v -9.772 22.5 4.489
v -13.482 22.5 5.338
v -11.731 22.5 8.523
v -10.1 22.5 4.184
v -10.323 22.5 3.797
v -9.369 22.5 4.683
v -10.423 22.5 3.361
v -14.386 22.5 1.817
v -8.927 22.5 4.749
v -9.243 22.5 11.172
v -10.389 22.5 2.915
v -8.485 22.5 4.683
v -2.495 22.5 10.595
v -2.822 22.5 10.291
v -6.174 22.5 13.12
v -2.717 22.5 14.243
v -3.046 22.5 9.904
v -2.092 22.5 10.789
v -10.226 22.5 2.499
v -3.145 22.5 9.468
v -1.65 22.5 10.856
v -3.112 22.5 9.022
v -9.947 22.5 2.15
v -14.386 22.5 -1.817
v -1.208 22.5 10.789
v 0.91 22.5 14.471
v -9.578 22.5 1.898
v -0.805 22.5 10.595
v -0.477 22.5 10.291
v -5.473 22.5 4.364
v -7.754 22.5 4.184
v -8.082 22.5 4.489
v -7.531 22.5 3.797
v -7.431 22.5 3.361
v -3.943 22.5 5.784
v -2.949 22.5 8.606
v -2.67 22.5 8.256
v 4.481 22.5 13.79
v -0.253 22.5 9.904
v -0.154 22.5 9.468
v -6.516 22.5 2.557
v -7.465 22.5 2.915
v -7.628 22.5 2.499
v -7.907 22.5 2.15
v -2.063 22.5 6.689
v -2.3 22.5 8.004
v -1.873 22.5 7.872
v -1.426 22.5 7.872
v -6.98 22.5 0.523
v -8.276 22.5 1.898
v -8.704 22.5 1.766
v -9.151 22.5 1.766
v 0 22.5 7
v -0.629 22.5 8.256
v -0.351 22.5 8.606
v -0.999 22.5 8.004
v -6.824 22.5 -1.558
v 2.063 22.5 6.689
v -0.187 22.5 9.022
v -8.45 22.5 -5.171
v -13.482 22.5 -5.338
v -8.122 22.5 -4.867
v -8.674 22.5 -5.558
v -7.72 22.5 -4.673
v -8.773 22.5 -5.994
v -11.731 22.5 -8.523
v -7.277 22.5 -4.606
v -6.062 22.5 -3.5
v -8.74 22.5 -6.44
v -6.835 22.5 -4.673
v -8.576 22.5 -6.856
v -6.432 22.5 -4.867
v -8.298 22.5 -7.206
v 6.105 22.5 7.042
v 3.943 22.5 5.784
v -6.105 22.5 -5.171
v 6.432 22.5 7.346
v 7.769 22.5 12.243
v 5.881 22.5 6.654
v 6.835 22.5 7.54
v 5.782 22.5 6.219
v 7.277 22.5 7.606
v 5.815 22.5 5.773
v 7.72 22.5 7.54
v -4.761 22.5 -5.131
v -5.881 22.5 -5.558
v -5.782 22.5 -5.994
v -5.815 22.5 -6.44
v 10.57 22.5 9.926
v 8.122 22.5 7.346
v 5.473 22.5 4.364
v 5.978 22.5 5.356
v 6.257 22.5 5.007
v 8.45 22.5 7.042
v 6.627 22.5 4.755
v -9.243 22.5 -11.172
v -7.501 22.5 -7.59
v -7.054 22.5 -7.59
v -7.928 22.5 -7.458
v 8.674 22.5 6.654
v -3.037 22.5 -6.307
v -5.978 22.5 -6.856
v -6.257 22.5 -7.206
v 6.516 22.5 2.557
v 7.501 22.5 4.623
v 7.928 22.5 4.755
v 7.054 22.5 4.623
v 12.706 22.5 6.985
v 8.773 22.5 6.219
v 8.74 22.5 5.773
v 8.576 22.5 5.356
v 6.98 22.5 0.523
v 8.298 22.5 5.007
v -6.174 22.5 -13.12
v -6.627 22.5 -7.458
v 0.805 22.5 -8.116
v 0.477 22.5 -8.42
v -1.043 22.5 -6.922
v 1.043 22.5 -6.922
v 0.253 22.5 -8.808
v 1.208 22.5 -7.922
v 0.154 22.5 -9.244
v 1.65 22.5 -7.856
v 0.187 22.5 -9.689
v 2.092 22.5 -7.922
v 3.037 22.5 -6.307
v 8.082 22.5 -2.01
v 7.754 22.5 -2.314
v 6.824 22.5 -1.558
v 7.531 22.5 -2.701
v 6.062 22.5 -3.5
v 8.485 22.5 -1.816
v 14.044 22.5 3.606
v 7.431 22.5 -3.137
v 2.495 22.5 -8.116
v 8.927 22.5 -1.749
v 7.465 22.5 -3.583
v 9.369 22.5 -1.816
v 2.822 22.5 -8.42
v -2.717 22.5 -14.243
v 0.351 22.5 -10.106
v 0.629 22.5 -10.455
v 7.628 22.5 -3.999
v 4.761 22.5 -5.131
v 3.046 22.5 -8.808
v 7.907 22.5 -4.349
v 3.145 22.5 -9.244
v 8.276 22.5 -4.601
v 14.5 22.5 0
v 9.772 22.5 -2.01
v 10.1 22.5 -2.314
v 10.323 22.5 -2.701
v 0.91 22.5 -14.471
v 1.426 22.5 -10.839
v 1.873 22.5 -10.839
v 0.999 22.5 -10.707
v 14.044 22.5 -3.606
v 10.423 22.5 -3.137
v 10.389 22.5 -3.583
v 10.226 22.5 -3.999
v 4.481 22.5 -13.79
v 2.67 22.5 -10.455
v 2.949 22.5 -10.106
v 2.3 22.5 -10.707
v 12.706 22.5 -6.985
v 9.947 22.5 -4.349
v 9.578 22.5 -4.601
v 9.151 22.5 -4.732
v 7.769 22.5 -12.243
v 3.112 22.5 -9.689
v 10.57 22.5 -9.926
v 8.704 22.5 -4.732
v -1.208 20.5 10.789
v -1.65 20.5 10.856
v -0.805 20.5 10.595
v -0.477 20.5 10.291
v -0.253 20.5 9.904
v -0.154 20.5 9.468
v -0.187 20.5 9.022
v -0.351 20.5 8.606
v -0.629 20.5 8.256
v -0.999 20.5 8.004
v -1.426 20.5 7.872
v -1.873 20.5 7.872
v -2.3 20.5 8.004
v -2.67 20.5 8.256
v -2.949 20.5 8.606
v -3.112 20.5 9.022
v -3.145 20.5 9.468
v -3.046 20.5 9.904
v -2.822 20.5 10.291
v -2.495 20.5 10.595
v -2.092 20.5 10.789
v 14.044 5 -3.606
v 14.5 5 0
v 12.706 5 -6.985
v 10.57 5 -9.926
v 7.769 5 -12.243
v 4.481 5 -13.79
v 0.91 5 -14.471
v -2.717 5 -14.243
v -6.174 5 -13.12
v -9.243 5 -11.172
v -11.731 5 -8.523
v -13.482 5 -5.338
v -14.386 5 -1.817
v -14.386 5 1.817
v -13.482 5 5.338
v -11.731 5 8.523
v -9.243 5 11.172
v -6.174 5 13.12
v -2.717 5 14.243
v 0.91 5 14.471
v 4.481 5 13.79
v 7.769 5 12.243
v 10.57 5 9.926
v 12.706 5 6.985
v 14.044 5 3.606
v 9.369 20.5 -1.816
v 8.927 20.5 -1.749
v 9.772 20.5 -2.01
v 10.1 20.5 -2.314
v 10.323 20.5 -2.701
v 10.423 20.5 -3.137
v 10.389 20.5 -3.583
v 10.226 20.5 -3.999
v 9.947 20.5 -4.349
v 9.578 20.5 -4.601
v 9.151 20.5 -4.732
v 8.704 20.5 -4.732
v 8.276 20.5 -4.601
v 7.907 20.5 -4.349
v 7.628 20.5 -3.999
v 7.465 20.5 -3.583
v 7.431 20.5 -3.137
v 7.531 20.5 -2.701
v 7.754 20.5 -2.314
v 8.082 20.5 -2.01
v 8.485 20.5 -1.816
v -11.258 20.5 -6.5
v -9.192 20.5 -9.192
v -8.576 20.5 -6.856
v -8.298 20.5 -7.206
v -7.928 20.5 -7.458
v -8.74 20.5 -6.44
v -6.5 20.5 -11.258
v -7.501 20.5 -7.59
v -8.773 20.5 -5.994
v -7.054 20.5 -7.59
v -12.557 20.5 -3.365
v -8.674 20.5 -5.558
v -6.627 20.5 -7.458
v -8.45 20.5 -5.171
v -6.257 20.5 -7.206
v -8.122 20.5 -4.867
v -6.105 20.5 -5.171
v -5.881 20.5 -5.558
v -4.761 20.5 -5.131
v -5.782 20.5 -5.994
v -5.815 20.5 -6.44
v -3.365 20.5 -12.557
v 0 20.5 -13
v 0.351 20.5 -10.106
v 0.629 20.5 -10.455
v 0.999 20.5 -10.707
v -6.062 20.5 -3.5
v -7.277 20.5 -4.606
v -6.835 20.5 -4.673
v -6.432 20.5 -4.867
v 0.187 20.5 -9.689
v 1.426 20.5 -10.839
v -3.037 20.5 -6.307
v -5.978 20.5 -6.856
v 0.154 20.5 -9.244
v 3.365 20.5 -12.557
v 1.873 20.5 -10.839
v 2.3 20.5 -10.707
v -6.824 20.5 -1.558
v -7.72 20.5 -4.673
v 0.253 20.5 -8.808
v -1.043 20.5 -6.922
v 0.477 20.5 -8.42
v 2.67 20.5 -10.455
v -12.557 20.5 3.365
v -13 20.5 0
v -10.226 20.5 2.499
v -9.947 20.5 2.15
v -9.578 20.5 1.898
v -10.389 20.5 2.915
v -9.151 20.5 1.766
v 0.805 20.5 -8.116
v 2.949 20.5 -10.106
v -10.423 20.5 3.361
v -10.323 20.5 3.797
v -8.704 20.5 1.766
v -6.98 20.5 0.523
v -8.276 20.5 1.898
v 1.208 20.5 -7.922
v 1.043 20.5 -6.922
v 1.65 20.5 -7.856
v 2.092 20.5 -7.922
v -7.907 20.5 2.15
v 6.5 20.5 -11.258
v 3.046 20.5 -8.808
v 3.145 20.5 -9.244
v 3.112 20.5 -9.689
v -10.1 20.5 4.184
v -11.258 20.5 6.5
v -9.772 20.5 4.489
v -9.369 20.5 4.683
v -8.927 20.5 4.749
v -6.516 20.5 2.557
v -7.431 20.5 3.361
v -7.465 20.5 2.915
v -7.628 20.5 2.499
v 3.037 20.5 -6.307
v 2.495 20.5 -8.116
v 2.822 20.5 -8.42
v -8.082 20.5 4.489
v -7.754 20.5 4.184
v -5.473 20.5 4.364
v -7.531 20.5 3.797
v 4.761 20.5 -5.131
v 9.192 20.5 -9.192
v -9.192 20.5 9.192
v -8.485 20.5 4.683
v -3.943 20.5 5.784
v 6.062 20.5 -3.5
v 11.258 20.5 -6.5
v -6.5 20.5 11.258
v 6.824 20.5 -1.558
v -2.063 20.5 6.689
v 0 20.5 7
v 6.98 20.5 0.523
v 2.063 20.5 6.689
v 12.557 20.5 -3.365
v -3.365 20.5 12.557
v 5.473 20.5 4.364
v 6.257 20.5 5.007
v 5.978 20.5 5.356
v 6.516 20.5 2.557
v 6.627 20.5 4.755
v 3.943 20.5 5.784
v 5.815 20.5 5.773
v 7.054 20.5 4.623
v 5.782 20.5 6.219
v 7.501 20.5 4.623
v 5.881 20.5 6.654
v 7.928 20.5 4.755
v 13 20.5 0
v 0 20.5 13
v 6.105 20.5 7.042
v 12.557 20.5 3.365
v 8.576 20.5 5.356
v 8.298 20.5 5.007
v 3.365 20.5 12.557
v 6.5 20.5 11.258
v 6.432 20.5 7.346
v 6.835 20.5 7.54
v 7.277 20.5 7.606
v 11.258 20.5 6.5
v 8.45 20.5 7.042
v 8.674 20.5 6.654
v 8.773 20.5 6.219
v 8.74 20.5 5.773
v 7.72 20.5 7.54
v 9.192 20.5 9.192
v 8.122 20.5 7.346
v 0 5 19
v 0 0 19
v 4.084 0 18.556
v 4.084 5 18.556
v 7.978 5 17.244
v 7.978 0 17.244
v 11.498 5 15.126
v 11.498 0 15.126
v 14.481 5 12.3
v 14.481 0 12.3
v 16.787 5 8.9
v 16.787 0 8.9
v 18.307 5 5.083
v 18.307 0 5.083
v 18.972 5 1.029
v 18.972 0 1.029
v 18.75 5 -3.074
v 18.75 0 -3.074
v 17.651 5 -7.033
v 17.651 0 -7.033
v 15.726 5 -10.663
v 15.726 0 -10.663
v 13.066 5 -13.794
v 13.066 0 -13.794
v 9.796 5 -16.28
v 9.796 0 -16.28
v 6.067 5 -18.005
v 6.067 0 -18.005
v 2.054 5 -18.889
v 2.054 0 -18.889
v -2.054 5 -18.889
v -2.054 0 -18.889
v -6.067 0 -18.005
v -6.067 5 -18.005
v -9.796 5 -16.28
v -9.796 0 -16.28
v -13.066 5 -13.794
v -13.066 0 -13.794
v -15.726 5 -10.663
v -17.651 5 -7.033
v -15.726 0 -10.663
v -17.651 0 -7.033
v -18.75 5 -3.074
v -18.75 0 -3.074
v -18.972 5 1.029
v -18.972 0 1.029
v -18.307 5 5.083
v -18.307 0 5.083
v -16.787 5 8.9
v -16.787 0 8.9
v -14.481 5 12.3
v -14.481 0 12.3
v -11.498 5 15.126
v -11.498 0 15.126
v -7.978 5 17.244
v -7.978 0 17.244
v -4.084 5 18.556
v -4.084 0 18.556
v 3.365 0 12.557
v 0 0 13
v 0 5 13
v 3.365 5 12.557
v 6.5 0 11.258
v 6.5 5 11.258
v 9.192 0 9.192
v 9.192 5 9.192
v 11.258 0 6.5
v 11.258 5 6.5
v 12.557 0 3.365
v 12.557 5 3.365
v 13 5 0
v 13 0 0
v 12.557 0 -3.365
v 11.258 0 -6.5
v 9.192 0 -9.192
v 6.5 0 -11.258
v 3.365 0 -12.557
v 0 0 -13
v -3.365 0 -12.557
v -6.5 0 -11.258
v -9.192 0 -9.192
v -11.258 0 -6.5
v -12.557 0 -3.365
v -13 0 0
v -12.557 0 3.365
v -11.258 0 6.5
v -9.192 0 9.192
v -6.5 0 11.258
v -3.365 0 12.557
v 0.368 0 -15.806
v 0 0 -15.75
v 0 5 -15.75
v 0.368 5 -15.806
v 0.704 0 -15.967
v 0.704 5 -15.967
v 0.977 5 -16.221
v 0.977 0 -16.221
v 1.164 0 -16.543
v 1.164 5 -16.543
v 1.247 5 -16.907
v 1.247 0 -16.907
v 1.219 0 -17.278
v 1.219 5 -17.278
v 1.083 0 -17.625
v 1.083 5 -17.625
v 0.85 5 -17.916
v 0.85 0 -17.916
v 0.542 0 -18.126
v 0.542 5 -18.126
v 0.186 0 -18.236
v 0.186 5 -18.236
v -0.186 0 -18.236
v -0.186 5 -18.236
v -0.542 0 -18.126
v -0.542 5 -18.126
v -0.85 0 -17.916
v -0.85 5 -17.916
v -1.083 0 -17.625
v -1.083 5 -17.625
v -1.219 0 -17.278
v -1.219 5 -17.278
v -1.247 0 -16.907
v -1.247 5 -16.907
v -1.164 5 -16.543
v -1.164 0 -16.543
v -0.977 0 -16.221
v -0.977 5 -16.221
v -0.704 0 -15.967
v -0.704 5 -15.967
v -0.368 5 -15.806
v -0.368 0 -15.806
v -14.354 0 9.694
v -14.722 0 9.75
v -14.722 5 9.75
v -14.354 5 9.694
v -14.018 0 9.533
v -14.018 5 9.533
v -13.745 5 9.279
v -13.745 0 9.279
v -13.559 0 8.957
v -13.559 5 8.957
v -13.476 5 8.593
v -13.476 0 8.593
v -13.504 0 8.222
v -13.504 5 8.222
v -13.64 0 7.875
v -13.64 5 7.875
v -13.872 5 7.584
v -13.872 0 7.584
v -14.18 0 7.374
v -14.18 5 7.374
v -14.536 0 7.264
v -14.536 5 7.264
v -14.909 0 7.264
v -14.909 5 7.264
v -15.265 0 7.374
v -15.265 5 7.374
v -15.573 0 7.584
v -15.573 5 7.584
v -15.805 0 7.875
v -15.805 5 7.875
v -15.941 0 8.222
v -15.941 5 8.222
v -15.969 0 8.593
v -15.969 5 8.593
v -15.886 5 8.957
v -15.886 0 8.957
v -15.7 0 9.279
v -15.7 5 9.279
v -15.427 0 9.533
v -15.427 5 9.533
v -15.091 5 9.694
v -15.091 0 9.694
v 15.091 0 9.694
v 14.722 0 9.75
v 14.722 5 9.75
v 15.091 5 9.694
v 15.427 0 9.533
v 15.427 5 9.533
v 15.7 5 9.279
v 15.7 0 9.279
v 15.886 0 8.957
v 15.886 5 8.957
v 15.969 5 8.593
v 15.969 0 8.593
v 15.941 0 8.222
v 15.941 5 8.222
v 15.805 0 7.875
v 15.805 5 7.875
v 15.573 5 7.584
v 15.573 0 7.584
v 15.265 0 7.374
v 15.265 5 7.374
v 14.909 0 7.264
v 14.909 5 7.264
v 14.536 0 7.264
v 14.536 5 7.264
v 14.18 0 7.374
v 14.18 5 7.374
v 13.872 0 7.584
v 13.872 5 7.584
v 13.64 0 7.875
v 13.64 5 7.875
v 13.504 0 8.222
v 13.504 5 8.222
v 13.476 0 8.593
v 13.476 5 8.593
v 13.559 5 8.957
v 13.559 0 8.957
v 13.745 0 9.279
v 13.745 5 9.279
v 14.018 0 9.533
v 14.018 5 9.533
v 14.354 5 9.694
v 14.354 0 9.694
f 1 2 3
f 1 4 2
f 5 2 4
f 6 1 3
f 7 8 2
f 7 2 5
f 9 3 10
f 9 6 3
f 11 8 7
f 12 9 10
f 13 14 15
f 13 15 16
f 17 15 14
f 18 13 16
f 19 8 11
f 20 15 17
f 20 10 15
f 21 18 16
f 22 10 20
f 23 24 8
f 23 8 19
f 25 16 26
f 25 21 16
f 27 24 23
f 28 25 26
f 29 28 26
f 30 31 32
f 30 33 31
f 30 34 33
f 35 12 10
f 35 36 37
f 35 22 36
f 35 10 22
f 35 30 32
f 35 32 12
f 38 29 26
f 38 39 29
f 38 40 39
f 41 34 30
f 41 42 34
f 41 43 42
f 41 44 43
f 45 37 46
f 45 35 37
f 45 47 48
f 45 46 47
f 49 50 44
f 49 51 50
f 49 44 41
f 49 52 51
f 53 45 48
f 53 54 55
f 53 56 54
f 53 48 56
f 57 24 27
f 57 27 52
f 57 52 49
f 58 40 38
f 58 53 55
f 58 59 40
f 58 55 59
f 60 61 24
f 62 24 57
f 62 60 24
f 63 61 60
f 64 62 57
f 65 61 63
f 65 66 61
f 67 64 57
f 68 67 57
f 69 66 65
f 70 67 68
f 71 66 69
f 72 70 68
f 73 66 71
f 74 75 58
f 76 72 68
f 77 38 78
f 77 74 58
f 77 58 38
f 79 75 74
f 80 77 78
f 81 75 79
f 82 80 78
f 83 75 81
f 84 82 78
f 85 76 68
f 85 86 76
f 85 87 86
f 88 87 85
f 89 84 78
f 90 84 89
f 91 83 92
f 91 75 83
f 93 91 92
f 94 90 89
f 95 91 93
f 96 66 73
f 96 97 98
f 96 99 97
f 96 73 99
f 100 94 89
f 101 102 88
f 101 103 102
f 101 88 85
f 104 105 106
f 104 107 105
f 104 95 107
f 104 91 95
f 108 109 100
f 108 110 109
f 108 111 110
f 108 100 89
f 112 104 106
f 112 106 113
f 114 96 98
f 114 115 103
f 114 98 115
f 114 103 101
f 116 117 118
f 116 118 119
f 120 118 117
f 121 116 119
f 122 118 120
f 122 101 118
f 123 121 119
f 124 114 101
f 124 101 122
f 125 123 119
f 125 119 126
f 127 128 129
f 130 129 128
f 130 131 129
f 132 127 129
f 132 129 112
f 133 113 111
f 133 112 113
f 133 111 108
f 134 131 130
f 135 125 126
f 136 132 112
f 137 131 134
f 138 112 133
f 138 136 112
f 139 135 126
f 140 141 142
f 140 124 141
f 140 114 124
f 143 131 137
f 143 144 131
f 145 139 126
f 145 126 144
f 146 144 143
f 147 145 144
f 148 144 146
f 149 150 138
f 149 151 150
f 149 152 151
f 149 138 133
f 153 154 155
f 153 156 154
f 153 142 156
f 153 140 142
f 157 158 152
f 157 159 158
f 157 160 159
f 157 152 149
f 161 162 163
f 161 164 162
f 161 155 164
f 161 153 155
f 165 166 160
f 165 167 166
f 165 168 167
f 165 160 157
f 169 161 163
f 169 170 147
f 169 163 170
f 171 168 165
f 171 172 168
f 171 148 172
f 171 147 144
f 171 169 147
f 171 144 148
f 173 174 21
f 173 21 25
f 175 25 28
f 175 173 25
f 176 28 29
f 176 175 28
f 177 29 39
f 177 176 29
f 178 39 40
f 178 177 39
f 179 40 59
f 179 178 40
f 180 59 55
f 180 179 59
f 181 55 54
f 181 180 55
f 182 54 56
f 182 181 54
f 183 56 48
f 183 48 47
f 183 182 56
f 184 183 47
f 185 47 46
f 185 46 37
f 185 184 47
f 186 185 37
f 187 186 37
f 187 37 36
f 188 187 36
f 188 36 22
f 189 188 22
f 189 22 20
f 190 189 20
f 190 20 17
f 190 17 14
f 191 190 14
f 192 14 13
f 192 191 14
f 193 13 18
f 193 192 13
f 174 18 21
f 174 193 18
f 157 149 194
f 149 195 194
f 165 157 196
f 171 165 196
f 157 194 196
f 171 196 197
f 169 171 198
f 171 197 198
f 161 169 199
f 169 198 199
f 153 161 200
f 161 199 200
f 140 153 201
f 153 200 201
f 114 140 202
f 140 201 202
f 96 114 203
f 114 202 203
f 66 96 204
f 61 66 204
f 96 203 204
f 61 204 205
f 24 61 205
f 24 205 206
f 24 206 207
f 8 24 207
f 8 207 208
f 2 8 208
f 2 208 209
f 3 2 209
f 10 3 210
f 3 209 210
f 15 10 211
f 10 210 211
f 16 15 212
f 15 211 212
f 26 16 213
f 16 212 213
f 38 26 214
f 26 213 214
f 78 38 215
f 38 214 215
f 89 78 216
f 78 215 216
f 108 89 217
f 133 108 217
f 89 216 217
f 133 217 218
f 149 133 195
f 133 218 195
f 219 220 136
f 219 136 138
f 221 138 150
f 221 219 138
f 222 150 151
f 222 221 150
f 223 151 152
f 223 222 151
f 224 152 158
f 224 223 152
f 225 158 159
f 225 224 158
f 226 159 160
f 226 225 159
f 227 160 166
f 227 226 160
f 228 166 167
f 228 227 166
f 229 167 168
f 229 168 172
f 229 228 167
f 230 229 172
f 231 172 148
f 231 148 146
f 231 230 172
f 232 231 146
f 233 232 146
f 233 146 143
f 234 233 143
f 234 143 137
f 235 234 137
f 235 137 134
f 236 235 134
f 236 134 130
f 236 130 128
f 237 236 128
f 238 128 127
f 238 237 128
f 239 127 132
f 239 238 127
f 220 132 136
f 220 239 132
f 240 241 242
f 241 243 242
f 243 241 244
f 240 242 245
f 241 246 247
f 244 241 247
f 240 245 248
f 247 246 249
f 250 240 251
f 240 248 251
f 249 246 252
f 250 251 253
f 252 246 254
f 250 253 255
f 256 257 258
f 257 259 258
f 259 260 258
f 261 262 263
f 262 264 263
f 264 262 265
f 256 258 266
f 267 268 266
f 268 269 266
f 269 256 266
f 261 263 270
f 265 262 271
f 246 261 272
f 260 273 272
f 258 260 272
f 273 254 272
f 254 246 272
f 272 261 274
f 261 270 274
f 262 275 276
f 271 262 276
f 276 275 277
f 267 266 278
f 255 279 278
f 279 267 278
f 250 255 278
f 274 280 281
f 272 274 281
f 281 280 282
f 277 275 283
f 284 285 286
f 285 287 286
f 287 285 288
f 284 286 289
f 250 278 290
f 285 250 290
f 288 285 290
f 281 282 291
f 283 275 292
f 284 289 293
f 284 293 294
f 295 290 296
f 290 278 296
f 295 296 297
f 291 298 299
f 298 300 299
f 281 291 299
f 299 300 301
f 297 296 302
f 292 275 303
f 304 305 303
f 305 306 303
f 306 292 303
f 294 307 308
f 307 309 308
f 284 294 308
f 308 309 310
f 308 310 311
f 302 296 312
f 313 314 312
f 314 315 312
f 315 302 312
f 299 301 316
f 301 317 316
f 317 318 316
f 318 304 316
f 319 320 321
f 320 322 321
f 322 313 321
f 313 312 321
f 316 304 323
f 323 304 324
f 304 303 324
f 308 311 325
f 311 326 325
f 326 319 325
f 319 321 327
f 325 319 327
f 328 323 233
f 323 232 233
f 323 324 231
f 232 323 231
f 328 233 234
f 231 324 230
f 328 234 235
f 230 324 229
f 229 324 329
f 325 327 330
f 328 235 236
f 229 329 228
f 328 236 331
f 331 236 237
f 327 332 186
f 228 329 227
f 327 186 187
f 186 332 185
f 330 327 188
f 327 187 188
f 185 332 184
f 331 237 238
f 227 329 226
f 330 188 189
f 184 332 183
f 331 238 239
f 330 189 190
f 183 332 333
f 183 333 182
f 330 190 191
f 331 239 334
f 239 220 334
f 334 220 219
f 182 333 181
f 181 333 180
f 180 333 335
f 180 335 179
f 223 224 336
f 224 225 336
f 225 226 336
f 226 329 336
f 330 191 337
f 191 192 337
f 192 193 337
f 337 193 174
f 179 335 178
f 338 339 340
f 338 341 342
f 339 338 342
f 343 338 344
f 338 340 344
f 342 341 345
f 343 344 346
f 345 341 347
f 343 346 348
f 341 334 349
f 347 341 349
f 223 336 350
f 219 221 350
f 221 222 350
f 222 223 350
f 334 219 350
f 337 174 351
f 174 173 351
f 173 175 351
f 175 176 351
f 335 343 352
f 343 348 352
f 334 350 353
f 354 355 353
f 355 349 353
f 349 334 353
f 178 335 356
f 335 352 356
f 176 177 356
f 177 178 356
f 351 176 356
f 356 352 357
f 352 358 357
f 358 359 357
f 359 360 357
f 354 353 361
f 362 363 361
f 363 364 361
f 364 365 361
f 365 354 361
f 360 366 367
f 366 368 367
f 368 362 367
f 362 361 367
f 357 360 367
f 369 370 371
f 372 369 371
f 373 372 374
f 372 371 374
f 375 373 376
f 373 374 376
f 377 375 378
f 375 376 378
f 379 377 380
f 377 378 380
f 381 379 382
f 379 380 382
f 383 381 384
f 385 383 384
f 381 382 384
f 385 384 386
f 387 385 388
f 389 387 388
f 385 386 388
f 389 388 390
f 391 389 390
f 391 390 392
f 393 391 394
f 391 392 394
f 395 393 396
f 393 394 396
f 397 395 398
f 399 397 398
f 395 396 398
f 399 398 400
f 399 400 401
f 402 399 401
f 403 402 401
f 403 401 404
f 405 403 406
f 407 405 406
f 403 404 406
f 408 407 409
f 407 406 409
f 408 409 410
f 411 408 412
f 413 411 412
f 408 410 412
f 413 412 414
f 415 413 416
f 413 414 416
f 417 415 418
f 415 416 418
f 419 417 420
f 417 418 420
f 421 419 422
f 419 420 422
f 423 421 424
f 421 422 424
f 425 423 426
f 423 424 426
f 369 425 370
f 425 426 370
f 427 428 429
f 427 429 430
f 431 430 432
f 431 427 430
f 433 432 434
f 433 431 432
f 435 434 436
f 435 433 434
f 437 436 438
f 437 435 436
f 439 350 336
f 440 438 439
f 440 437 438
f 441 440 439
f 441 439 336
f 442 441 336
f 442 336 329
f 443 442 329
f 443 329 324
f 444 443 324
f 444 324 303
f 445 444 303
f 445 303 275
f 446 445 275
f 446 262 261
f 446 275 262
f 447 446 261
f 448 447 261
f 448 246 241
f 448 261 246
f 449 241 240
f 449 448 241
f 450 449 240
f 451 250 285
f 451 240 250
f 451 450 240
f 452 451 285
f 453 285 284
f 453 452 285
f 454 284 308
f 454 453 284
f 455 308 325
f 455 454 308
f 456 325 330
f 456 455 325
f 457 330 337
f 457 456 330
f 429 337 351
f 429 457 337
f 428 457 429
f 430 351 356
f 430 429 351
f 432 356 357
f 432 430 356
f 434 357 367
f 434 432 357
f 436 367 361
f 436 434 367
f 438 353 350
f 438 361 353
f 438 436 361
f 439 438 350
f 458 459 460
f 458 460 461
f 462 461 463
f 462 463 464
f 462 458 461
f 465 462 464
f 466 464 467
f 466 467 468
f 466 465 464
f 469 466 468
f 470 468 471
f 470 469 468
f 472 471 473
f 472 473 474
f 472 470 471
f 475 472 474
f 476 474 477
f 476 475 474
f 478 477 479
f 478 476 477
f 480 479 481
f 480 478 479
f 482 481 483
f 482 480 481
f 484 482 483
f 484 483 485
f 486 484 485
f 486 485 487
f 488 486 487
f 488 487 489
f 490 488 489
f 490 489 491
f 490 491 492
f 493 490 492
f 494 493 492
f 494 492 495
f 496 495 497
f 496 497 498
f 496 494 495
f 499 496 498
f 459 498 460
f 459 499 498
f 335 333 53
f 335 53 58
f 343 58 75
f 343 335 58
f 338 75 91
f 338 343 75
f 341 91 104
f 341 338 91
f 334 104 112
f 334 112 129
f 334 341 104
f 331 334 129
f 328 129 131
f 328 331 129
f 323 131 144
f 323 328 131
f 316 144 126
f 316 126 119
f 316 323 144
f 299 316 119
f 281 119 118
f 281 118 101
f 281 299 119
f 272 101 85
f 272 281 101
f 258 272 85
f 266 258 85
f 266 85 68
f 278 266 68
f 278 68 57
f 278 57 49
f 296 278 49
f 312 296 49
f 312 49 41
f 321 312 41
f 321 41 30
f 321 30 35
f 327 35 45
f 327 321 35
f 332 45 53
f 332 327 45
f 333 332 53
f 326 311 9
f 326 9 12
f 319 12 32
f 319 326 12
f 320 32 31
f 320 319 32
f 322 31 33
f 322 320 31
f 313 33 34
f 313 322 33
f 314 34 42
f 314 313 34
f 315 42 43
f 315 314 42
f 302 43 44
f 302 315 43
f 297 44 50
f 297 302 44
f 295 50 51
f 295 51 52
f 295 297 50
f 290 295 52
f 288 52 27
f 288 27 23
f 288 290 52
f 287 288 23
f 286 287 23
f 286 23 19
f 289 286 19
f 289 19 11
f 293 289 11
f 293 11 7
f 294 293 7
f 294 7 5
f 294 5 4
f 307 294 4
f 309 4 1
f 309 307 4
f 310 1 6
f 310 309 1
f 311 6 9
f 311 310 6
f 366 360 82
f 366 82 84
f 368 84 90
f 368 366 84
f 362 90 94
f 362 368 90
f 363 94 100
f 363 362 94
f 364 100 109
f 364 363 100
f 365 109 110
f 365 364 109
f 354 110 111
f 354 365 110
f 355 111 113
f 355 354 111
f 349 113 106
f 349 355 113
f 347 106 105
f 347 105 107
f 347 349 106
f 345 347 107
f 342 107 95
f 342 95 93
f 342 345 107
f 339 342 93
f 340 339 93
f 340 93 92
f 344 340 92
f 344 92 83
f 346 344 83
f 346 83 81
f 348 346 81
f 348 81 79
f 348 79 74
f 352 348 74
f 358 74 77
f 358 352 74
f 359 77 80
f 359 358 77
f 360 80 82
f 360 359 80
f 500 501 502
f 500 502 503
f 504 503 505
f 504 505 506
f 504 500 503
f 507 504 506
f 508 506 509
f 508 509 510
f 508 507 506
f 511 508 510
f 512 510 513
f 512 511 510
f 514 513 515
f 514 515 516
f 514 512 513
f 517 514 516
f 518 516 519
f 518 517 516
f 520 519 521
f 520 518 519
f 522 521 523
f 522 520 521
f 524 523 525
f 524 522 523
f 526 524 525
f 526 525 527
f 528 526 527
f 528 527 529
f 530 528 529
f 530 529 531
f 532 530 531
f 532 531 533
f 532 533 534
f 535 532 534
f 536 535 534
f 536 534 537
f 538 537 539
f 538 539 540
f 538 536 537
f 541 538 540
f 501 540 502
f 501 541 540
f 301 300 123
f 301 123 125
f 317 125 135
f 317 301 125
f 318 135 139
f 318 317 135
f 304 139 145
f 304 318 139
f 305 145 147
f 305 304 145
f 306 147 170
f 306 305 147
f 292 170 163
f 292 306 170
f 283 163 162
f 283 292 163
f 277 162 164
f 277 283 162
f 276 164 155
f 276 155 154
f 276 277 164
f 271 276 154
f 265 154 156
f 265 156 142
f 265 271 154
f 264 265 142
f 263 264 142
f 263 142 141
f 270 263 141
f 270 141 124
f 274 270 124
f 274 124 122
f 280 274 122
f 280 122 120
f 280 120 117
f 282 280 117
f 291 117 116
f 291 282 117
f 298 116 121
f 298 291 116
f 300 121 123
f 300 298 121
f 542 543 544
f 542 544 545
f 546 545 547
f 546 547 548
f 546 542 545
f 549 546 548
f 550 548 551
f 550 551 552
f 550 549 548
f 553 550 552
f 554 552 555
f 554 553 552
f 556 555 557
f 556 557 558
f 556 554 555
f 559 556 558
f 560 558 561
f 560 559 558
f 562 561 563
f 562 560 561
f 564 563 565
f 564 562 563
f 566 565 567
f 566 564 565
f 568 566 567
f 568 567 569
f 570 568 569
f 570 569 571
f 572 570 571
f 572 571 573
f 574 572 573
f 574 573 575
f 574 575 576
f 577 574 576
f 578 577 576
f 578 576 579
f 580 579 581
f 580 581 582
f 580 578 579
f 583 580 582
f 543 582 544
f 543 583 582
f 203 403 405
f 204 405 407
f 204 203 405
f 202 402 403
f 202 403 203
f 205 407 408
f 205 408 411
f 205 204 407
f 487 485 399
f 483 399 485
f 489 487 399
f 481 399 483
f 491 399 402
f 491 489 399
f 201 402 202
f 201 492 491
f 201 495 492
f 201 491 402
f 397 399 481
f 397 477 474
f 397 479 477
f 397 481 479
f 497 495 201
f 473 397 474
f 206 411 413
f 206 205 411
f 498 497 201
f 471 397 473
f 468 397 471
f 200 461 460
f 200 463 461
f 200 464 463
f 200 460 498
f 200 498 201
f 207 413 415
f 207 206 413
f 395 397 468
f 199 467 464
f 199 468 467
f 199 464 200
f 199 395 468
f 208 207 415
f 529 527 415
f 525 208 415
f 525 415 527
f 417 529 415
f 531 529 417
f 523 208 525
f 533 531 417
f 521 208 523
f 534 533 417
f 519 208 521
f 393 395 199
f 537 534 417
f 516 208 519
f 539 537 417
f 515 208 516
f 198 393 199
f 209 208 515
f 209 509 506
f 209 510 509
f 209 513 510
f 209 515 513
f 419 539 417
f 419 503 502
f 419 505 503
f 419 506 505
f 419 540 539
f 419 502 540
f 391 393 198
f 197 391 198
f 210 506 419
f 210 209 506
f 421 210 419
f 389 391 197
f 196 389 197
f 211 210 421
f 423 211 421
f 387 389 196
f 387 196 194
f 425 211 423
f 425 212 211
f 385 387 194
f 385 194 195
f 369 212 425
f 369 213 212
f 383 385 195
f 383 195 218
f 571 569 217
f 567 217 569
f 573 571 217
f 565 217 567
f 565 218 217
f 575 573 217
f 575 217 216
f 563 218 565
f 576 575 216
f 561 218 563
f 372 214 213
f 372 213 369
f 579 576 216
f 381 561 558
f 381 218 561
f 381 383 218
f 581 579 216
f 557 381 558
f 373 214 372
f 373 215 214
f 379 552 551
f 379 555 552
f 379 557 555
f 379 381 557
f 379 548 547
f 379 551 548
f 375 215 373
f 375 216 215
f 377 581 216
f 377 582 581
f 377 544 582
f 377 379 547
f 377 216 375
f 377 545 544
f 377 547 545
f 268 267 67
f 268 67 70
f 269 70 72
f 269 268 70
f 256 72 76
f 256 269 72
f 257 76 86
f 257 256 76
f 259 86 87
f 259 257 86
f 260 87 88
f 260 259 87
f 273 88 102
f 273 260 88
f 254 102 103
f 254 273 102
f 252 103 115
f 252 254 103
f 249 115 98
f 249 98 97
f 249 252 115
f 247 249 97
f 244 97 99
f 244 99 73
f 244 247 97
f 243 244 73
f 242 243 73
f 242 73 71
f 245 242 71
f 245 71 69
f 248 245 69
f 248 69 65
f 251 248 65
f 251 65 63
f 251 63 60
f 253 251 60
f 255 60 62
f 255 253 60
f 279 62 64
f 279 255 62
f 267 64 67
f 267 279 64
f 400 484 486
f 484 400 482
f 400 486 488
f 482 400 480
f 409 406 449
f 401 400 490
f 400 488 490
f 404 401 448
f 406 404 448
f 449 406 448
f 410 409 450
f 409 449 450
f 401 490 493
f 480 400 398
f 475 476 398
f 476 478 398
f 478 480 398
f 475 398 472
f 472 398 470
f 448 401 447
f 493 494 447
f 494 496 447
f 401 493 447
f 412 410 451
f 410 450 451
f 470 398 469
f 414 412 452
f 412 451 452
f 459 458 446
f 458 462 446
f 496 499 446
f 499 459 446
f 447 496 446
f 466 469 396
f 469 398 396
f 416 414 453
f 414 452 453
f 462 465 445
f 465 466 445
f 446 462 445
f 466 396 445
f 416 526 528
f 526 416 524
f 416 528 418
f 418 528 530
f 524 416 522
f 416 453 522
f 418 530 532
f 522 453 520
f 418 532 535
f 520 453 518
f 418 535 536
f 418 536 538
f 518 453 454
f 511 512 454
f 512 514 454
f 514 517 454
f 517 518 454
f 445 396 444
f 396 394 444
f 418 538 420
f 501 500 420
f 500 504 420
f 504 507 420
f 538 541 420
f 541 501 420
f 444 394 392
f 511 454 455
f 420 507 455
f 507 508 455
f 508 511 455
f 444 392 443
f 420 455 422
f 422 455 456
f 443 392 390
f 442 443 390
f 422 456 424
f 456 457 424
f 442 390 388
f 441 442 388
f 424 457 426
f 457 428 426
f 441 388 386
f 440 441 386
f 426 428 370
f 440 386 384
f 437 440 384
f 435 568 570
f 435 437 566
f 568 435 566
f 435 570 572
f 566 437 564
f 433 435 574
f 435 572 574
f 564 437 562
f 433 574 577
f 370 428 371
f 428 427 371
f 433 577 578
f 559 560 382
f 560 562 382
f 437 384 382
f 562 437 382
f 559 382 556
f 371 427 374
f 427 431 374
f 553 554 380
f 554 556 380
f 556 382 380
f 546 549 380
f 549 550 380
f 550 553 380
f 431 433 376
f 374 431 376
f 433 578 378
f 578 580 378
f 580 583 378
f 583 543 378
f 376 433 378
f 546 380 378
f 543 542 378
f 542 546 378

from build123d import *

# Parameters (mm, degrees)
SKETCH_1_R        = 19
SKETCH_1_R_2      = 13
SKETCH_1_R_3      = 1.25
EXTRUDE_1_DEPTH   = 5
SKETCH_2_R        = 14.5
SKETCH_2_R_2      = 13
EXTRUDE_1_2_DEPTH = 15.5
SKETCH_3_R        = 14.5
SKETCH_3_R_2      = 13
SKETCH_3_R_3      = 7
SKETCH_3_R_4      = 1.5
EXTRUDE_2_DEPTH   = 2


with BuildPart() as part:
    # 草图1 → Extrude 1 (new body)
    with BuildSketch(Plane(origin=(0, 0, 0), x_dir=(1, 0, 0), z_dir=(0, 1, 0))):
        with Locations(Location((0, 0, 0), (0, 0, 270))):
            Circle(SKETCH_1_R)
        with Locations(Location((0, 0, 0), (0, 0, 270))):
            Circle(SKETCH_1_R_2, mode=Mode.SUBTRACT)
        with Locations(Location((0, 17, 0), (0, 0, 270))):
            Circle(SKETCH_1_R_3, mode=Mode.SUBTRACT)
        with Locations(Location((14.722431864, -8.5, 0), (0, 0, 270))):
            Circle(SKETCH_1_R_3, mode=Mode.SUBTRACT)
        with Locations(Location((-14.722431864, -8.5, 0), (0, 0, 270))):
            Circle(SKETCH_1_R_3, mode=Mode.SUBTRACT)
    extrude(amount=EXTRUDE_1_DEPTH)

    # 草图2 → Extrude 1 2 (add)
    with BuildSketch(Plane(origin=(0, 5, 0), x_dir=(1, 0, 0), z_dir=(0, 1, 0))):
        Circle(SKETCH_2_R)
        Circle(SKETCH_2_R_2, mode=Mode.SUBTRACT)
    extrude(amount=EXTRUDE_1_2_DEPTH)

    # 草图3 → 凸台-拉伸2 (add)
    # profile 1 of 2: a face of its own
    with BuildSketch(Plane(origin=(0, 20.5, 0), x_dir=(1, 0, 0), z_dir=(0, 1, 0))):
        Circle(SKETCH_3_R)
        with Locations(Location((0, 0, 0), (0, 0, 270))):
            Circle(SKETCH_3_R_2, mode=Mode.SUBTRACT)
    # profile 2 of 2: a face of its own
    with BuildSketch(Plane(origin=(0, 20.5, 0), x_dir=(1, 0, 0), z_dir=(0, 1, 0))):
        with Locations(Location((0, 0, 0), (0, 0, 270))):
            Circle(SKETCH_3_R_2)
        with Locations(Location((0, 0, 0), (0, 0, 270))):
            Circle(SKETCH_3_R_3, mode=Mode.SUBTRACT)
        with Locations(Location((-7.27742221, 6.106482292, 0), (0, 0, 270))):
            Circle(SKETCH_3_R_4, mode=Mode.SUBTRACT)
        with Locations(Location((-8.927079897, -3.249191362, 0), (0, 0, 270))):
            Circle(SKETCH_3_R_4, mode=Mode.SUBTRACT)
        with Locations(Location((-1.649657688, -9.355673654, 0), (0, 0, 270))):
            Circle(SKETCH_3_R_4, mode=Mode.SUBTRACT)
        with Locations(Location((7.27742221, -6.106482292, 0), (0, 0, 270))):
            Circle(SKETCH_3_R_4, mode=Mode.SUBTRACT)
        with Locations(Location((8.927079897, 3.249191362, 0), (0, 0, 270))):
            Circle(SKETCH_3_R_4, mode=Mode.SUBTRACT)
        with Locations(Location((1.649657688, 9.355673654, 0), (0, 0, 270))):
            Circle(SKETCH_3_R_4, mode=Mode.SUBTRACT)
    extrude(amount=EXTRUDE_2_DEPTH)


solid = part.part
